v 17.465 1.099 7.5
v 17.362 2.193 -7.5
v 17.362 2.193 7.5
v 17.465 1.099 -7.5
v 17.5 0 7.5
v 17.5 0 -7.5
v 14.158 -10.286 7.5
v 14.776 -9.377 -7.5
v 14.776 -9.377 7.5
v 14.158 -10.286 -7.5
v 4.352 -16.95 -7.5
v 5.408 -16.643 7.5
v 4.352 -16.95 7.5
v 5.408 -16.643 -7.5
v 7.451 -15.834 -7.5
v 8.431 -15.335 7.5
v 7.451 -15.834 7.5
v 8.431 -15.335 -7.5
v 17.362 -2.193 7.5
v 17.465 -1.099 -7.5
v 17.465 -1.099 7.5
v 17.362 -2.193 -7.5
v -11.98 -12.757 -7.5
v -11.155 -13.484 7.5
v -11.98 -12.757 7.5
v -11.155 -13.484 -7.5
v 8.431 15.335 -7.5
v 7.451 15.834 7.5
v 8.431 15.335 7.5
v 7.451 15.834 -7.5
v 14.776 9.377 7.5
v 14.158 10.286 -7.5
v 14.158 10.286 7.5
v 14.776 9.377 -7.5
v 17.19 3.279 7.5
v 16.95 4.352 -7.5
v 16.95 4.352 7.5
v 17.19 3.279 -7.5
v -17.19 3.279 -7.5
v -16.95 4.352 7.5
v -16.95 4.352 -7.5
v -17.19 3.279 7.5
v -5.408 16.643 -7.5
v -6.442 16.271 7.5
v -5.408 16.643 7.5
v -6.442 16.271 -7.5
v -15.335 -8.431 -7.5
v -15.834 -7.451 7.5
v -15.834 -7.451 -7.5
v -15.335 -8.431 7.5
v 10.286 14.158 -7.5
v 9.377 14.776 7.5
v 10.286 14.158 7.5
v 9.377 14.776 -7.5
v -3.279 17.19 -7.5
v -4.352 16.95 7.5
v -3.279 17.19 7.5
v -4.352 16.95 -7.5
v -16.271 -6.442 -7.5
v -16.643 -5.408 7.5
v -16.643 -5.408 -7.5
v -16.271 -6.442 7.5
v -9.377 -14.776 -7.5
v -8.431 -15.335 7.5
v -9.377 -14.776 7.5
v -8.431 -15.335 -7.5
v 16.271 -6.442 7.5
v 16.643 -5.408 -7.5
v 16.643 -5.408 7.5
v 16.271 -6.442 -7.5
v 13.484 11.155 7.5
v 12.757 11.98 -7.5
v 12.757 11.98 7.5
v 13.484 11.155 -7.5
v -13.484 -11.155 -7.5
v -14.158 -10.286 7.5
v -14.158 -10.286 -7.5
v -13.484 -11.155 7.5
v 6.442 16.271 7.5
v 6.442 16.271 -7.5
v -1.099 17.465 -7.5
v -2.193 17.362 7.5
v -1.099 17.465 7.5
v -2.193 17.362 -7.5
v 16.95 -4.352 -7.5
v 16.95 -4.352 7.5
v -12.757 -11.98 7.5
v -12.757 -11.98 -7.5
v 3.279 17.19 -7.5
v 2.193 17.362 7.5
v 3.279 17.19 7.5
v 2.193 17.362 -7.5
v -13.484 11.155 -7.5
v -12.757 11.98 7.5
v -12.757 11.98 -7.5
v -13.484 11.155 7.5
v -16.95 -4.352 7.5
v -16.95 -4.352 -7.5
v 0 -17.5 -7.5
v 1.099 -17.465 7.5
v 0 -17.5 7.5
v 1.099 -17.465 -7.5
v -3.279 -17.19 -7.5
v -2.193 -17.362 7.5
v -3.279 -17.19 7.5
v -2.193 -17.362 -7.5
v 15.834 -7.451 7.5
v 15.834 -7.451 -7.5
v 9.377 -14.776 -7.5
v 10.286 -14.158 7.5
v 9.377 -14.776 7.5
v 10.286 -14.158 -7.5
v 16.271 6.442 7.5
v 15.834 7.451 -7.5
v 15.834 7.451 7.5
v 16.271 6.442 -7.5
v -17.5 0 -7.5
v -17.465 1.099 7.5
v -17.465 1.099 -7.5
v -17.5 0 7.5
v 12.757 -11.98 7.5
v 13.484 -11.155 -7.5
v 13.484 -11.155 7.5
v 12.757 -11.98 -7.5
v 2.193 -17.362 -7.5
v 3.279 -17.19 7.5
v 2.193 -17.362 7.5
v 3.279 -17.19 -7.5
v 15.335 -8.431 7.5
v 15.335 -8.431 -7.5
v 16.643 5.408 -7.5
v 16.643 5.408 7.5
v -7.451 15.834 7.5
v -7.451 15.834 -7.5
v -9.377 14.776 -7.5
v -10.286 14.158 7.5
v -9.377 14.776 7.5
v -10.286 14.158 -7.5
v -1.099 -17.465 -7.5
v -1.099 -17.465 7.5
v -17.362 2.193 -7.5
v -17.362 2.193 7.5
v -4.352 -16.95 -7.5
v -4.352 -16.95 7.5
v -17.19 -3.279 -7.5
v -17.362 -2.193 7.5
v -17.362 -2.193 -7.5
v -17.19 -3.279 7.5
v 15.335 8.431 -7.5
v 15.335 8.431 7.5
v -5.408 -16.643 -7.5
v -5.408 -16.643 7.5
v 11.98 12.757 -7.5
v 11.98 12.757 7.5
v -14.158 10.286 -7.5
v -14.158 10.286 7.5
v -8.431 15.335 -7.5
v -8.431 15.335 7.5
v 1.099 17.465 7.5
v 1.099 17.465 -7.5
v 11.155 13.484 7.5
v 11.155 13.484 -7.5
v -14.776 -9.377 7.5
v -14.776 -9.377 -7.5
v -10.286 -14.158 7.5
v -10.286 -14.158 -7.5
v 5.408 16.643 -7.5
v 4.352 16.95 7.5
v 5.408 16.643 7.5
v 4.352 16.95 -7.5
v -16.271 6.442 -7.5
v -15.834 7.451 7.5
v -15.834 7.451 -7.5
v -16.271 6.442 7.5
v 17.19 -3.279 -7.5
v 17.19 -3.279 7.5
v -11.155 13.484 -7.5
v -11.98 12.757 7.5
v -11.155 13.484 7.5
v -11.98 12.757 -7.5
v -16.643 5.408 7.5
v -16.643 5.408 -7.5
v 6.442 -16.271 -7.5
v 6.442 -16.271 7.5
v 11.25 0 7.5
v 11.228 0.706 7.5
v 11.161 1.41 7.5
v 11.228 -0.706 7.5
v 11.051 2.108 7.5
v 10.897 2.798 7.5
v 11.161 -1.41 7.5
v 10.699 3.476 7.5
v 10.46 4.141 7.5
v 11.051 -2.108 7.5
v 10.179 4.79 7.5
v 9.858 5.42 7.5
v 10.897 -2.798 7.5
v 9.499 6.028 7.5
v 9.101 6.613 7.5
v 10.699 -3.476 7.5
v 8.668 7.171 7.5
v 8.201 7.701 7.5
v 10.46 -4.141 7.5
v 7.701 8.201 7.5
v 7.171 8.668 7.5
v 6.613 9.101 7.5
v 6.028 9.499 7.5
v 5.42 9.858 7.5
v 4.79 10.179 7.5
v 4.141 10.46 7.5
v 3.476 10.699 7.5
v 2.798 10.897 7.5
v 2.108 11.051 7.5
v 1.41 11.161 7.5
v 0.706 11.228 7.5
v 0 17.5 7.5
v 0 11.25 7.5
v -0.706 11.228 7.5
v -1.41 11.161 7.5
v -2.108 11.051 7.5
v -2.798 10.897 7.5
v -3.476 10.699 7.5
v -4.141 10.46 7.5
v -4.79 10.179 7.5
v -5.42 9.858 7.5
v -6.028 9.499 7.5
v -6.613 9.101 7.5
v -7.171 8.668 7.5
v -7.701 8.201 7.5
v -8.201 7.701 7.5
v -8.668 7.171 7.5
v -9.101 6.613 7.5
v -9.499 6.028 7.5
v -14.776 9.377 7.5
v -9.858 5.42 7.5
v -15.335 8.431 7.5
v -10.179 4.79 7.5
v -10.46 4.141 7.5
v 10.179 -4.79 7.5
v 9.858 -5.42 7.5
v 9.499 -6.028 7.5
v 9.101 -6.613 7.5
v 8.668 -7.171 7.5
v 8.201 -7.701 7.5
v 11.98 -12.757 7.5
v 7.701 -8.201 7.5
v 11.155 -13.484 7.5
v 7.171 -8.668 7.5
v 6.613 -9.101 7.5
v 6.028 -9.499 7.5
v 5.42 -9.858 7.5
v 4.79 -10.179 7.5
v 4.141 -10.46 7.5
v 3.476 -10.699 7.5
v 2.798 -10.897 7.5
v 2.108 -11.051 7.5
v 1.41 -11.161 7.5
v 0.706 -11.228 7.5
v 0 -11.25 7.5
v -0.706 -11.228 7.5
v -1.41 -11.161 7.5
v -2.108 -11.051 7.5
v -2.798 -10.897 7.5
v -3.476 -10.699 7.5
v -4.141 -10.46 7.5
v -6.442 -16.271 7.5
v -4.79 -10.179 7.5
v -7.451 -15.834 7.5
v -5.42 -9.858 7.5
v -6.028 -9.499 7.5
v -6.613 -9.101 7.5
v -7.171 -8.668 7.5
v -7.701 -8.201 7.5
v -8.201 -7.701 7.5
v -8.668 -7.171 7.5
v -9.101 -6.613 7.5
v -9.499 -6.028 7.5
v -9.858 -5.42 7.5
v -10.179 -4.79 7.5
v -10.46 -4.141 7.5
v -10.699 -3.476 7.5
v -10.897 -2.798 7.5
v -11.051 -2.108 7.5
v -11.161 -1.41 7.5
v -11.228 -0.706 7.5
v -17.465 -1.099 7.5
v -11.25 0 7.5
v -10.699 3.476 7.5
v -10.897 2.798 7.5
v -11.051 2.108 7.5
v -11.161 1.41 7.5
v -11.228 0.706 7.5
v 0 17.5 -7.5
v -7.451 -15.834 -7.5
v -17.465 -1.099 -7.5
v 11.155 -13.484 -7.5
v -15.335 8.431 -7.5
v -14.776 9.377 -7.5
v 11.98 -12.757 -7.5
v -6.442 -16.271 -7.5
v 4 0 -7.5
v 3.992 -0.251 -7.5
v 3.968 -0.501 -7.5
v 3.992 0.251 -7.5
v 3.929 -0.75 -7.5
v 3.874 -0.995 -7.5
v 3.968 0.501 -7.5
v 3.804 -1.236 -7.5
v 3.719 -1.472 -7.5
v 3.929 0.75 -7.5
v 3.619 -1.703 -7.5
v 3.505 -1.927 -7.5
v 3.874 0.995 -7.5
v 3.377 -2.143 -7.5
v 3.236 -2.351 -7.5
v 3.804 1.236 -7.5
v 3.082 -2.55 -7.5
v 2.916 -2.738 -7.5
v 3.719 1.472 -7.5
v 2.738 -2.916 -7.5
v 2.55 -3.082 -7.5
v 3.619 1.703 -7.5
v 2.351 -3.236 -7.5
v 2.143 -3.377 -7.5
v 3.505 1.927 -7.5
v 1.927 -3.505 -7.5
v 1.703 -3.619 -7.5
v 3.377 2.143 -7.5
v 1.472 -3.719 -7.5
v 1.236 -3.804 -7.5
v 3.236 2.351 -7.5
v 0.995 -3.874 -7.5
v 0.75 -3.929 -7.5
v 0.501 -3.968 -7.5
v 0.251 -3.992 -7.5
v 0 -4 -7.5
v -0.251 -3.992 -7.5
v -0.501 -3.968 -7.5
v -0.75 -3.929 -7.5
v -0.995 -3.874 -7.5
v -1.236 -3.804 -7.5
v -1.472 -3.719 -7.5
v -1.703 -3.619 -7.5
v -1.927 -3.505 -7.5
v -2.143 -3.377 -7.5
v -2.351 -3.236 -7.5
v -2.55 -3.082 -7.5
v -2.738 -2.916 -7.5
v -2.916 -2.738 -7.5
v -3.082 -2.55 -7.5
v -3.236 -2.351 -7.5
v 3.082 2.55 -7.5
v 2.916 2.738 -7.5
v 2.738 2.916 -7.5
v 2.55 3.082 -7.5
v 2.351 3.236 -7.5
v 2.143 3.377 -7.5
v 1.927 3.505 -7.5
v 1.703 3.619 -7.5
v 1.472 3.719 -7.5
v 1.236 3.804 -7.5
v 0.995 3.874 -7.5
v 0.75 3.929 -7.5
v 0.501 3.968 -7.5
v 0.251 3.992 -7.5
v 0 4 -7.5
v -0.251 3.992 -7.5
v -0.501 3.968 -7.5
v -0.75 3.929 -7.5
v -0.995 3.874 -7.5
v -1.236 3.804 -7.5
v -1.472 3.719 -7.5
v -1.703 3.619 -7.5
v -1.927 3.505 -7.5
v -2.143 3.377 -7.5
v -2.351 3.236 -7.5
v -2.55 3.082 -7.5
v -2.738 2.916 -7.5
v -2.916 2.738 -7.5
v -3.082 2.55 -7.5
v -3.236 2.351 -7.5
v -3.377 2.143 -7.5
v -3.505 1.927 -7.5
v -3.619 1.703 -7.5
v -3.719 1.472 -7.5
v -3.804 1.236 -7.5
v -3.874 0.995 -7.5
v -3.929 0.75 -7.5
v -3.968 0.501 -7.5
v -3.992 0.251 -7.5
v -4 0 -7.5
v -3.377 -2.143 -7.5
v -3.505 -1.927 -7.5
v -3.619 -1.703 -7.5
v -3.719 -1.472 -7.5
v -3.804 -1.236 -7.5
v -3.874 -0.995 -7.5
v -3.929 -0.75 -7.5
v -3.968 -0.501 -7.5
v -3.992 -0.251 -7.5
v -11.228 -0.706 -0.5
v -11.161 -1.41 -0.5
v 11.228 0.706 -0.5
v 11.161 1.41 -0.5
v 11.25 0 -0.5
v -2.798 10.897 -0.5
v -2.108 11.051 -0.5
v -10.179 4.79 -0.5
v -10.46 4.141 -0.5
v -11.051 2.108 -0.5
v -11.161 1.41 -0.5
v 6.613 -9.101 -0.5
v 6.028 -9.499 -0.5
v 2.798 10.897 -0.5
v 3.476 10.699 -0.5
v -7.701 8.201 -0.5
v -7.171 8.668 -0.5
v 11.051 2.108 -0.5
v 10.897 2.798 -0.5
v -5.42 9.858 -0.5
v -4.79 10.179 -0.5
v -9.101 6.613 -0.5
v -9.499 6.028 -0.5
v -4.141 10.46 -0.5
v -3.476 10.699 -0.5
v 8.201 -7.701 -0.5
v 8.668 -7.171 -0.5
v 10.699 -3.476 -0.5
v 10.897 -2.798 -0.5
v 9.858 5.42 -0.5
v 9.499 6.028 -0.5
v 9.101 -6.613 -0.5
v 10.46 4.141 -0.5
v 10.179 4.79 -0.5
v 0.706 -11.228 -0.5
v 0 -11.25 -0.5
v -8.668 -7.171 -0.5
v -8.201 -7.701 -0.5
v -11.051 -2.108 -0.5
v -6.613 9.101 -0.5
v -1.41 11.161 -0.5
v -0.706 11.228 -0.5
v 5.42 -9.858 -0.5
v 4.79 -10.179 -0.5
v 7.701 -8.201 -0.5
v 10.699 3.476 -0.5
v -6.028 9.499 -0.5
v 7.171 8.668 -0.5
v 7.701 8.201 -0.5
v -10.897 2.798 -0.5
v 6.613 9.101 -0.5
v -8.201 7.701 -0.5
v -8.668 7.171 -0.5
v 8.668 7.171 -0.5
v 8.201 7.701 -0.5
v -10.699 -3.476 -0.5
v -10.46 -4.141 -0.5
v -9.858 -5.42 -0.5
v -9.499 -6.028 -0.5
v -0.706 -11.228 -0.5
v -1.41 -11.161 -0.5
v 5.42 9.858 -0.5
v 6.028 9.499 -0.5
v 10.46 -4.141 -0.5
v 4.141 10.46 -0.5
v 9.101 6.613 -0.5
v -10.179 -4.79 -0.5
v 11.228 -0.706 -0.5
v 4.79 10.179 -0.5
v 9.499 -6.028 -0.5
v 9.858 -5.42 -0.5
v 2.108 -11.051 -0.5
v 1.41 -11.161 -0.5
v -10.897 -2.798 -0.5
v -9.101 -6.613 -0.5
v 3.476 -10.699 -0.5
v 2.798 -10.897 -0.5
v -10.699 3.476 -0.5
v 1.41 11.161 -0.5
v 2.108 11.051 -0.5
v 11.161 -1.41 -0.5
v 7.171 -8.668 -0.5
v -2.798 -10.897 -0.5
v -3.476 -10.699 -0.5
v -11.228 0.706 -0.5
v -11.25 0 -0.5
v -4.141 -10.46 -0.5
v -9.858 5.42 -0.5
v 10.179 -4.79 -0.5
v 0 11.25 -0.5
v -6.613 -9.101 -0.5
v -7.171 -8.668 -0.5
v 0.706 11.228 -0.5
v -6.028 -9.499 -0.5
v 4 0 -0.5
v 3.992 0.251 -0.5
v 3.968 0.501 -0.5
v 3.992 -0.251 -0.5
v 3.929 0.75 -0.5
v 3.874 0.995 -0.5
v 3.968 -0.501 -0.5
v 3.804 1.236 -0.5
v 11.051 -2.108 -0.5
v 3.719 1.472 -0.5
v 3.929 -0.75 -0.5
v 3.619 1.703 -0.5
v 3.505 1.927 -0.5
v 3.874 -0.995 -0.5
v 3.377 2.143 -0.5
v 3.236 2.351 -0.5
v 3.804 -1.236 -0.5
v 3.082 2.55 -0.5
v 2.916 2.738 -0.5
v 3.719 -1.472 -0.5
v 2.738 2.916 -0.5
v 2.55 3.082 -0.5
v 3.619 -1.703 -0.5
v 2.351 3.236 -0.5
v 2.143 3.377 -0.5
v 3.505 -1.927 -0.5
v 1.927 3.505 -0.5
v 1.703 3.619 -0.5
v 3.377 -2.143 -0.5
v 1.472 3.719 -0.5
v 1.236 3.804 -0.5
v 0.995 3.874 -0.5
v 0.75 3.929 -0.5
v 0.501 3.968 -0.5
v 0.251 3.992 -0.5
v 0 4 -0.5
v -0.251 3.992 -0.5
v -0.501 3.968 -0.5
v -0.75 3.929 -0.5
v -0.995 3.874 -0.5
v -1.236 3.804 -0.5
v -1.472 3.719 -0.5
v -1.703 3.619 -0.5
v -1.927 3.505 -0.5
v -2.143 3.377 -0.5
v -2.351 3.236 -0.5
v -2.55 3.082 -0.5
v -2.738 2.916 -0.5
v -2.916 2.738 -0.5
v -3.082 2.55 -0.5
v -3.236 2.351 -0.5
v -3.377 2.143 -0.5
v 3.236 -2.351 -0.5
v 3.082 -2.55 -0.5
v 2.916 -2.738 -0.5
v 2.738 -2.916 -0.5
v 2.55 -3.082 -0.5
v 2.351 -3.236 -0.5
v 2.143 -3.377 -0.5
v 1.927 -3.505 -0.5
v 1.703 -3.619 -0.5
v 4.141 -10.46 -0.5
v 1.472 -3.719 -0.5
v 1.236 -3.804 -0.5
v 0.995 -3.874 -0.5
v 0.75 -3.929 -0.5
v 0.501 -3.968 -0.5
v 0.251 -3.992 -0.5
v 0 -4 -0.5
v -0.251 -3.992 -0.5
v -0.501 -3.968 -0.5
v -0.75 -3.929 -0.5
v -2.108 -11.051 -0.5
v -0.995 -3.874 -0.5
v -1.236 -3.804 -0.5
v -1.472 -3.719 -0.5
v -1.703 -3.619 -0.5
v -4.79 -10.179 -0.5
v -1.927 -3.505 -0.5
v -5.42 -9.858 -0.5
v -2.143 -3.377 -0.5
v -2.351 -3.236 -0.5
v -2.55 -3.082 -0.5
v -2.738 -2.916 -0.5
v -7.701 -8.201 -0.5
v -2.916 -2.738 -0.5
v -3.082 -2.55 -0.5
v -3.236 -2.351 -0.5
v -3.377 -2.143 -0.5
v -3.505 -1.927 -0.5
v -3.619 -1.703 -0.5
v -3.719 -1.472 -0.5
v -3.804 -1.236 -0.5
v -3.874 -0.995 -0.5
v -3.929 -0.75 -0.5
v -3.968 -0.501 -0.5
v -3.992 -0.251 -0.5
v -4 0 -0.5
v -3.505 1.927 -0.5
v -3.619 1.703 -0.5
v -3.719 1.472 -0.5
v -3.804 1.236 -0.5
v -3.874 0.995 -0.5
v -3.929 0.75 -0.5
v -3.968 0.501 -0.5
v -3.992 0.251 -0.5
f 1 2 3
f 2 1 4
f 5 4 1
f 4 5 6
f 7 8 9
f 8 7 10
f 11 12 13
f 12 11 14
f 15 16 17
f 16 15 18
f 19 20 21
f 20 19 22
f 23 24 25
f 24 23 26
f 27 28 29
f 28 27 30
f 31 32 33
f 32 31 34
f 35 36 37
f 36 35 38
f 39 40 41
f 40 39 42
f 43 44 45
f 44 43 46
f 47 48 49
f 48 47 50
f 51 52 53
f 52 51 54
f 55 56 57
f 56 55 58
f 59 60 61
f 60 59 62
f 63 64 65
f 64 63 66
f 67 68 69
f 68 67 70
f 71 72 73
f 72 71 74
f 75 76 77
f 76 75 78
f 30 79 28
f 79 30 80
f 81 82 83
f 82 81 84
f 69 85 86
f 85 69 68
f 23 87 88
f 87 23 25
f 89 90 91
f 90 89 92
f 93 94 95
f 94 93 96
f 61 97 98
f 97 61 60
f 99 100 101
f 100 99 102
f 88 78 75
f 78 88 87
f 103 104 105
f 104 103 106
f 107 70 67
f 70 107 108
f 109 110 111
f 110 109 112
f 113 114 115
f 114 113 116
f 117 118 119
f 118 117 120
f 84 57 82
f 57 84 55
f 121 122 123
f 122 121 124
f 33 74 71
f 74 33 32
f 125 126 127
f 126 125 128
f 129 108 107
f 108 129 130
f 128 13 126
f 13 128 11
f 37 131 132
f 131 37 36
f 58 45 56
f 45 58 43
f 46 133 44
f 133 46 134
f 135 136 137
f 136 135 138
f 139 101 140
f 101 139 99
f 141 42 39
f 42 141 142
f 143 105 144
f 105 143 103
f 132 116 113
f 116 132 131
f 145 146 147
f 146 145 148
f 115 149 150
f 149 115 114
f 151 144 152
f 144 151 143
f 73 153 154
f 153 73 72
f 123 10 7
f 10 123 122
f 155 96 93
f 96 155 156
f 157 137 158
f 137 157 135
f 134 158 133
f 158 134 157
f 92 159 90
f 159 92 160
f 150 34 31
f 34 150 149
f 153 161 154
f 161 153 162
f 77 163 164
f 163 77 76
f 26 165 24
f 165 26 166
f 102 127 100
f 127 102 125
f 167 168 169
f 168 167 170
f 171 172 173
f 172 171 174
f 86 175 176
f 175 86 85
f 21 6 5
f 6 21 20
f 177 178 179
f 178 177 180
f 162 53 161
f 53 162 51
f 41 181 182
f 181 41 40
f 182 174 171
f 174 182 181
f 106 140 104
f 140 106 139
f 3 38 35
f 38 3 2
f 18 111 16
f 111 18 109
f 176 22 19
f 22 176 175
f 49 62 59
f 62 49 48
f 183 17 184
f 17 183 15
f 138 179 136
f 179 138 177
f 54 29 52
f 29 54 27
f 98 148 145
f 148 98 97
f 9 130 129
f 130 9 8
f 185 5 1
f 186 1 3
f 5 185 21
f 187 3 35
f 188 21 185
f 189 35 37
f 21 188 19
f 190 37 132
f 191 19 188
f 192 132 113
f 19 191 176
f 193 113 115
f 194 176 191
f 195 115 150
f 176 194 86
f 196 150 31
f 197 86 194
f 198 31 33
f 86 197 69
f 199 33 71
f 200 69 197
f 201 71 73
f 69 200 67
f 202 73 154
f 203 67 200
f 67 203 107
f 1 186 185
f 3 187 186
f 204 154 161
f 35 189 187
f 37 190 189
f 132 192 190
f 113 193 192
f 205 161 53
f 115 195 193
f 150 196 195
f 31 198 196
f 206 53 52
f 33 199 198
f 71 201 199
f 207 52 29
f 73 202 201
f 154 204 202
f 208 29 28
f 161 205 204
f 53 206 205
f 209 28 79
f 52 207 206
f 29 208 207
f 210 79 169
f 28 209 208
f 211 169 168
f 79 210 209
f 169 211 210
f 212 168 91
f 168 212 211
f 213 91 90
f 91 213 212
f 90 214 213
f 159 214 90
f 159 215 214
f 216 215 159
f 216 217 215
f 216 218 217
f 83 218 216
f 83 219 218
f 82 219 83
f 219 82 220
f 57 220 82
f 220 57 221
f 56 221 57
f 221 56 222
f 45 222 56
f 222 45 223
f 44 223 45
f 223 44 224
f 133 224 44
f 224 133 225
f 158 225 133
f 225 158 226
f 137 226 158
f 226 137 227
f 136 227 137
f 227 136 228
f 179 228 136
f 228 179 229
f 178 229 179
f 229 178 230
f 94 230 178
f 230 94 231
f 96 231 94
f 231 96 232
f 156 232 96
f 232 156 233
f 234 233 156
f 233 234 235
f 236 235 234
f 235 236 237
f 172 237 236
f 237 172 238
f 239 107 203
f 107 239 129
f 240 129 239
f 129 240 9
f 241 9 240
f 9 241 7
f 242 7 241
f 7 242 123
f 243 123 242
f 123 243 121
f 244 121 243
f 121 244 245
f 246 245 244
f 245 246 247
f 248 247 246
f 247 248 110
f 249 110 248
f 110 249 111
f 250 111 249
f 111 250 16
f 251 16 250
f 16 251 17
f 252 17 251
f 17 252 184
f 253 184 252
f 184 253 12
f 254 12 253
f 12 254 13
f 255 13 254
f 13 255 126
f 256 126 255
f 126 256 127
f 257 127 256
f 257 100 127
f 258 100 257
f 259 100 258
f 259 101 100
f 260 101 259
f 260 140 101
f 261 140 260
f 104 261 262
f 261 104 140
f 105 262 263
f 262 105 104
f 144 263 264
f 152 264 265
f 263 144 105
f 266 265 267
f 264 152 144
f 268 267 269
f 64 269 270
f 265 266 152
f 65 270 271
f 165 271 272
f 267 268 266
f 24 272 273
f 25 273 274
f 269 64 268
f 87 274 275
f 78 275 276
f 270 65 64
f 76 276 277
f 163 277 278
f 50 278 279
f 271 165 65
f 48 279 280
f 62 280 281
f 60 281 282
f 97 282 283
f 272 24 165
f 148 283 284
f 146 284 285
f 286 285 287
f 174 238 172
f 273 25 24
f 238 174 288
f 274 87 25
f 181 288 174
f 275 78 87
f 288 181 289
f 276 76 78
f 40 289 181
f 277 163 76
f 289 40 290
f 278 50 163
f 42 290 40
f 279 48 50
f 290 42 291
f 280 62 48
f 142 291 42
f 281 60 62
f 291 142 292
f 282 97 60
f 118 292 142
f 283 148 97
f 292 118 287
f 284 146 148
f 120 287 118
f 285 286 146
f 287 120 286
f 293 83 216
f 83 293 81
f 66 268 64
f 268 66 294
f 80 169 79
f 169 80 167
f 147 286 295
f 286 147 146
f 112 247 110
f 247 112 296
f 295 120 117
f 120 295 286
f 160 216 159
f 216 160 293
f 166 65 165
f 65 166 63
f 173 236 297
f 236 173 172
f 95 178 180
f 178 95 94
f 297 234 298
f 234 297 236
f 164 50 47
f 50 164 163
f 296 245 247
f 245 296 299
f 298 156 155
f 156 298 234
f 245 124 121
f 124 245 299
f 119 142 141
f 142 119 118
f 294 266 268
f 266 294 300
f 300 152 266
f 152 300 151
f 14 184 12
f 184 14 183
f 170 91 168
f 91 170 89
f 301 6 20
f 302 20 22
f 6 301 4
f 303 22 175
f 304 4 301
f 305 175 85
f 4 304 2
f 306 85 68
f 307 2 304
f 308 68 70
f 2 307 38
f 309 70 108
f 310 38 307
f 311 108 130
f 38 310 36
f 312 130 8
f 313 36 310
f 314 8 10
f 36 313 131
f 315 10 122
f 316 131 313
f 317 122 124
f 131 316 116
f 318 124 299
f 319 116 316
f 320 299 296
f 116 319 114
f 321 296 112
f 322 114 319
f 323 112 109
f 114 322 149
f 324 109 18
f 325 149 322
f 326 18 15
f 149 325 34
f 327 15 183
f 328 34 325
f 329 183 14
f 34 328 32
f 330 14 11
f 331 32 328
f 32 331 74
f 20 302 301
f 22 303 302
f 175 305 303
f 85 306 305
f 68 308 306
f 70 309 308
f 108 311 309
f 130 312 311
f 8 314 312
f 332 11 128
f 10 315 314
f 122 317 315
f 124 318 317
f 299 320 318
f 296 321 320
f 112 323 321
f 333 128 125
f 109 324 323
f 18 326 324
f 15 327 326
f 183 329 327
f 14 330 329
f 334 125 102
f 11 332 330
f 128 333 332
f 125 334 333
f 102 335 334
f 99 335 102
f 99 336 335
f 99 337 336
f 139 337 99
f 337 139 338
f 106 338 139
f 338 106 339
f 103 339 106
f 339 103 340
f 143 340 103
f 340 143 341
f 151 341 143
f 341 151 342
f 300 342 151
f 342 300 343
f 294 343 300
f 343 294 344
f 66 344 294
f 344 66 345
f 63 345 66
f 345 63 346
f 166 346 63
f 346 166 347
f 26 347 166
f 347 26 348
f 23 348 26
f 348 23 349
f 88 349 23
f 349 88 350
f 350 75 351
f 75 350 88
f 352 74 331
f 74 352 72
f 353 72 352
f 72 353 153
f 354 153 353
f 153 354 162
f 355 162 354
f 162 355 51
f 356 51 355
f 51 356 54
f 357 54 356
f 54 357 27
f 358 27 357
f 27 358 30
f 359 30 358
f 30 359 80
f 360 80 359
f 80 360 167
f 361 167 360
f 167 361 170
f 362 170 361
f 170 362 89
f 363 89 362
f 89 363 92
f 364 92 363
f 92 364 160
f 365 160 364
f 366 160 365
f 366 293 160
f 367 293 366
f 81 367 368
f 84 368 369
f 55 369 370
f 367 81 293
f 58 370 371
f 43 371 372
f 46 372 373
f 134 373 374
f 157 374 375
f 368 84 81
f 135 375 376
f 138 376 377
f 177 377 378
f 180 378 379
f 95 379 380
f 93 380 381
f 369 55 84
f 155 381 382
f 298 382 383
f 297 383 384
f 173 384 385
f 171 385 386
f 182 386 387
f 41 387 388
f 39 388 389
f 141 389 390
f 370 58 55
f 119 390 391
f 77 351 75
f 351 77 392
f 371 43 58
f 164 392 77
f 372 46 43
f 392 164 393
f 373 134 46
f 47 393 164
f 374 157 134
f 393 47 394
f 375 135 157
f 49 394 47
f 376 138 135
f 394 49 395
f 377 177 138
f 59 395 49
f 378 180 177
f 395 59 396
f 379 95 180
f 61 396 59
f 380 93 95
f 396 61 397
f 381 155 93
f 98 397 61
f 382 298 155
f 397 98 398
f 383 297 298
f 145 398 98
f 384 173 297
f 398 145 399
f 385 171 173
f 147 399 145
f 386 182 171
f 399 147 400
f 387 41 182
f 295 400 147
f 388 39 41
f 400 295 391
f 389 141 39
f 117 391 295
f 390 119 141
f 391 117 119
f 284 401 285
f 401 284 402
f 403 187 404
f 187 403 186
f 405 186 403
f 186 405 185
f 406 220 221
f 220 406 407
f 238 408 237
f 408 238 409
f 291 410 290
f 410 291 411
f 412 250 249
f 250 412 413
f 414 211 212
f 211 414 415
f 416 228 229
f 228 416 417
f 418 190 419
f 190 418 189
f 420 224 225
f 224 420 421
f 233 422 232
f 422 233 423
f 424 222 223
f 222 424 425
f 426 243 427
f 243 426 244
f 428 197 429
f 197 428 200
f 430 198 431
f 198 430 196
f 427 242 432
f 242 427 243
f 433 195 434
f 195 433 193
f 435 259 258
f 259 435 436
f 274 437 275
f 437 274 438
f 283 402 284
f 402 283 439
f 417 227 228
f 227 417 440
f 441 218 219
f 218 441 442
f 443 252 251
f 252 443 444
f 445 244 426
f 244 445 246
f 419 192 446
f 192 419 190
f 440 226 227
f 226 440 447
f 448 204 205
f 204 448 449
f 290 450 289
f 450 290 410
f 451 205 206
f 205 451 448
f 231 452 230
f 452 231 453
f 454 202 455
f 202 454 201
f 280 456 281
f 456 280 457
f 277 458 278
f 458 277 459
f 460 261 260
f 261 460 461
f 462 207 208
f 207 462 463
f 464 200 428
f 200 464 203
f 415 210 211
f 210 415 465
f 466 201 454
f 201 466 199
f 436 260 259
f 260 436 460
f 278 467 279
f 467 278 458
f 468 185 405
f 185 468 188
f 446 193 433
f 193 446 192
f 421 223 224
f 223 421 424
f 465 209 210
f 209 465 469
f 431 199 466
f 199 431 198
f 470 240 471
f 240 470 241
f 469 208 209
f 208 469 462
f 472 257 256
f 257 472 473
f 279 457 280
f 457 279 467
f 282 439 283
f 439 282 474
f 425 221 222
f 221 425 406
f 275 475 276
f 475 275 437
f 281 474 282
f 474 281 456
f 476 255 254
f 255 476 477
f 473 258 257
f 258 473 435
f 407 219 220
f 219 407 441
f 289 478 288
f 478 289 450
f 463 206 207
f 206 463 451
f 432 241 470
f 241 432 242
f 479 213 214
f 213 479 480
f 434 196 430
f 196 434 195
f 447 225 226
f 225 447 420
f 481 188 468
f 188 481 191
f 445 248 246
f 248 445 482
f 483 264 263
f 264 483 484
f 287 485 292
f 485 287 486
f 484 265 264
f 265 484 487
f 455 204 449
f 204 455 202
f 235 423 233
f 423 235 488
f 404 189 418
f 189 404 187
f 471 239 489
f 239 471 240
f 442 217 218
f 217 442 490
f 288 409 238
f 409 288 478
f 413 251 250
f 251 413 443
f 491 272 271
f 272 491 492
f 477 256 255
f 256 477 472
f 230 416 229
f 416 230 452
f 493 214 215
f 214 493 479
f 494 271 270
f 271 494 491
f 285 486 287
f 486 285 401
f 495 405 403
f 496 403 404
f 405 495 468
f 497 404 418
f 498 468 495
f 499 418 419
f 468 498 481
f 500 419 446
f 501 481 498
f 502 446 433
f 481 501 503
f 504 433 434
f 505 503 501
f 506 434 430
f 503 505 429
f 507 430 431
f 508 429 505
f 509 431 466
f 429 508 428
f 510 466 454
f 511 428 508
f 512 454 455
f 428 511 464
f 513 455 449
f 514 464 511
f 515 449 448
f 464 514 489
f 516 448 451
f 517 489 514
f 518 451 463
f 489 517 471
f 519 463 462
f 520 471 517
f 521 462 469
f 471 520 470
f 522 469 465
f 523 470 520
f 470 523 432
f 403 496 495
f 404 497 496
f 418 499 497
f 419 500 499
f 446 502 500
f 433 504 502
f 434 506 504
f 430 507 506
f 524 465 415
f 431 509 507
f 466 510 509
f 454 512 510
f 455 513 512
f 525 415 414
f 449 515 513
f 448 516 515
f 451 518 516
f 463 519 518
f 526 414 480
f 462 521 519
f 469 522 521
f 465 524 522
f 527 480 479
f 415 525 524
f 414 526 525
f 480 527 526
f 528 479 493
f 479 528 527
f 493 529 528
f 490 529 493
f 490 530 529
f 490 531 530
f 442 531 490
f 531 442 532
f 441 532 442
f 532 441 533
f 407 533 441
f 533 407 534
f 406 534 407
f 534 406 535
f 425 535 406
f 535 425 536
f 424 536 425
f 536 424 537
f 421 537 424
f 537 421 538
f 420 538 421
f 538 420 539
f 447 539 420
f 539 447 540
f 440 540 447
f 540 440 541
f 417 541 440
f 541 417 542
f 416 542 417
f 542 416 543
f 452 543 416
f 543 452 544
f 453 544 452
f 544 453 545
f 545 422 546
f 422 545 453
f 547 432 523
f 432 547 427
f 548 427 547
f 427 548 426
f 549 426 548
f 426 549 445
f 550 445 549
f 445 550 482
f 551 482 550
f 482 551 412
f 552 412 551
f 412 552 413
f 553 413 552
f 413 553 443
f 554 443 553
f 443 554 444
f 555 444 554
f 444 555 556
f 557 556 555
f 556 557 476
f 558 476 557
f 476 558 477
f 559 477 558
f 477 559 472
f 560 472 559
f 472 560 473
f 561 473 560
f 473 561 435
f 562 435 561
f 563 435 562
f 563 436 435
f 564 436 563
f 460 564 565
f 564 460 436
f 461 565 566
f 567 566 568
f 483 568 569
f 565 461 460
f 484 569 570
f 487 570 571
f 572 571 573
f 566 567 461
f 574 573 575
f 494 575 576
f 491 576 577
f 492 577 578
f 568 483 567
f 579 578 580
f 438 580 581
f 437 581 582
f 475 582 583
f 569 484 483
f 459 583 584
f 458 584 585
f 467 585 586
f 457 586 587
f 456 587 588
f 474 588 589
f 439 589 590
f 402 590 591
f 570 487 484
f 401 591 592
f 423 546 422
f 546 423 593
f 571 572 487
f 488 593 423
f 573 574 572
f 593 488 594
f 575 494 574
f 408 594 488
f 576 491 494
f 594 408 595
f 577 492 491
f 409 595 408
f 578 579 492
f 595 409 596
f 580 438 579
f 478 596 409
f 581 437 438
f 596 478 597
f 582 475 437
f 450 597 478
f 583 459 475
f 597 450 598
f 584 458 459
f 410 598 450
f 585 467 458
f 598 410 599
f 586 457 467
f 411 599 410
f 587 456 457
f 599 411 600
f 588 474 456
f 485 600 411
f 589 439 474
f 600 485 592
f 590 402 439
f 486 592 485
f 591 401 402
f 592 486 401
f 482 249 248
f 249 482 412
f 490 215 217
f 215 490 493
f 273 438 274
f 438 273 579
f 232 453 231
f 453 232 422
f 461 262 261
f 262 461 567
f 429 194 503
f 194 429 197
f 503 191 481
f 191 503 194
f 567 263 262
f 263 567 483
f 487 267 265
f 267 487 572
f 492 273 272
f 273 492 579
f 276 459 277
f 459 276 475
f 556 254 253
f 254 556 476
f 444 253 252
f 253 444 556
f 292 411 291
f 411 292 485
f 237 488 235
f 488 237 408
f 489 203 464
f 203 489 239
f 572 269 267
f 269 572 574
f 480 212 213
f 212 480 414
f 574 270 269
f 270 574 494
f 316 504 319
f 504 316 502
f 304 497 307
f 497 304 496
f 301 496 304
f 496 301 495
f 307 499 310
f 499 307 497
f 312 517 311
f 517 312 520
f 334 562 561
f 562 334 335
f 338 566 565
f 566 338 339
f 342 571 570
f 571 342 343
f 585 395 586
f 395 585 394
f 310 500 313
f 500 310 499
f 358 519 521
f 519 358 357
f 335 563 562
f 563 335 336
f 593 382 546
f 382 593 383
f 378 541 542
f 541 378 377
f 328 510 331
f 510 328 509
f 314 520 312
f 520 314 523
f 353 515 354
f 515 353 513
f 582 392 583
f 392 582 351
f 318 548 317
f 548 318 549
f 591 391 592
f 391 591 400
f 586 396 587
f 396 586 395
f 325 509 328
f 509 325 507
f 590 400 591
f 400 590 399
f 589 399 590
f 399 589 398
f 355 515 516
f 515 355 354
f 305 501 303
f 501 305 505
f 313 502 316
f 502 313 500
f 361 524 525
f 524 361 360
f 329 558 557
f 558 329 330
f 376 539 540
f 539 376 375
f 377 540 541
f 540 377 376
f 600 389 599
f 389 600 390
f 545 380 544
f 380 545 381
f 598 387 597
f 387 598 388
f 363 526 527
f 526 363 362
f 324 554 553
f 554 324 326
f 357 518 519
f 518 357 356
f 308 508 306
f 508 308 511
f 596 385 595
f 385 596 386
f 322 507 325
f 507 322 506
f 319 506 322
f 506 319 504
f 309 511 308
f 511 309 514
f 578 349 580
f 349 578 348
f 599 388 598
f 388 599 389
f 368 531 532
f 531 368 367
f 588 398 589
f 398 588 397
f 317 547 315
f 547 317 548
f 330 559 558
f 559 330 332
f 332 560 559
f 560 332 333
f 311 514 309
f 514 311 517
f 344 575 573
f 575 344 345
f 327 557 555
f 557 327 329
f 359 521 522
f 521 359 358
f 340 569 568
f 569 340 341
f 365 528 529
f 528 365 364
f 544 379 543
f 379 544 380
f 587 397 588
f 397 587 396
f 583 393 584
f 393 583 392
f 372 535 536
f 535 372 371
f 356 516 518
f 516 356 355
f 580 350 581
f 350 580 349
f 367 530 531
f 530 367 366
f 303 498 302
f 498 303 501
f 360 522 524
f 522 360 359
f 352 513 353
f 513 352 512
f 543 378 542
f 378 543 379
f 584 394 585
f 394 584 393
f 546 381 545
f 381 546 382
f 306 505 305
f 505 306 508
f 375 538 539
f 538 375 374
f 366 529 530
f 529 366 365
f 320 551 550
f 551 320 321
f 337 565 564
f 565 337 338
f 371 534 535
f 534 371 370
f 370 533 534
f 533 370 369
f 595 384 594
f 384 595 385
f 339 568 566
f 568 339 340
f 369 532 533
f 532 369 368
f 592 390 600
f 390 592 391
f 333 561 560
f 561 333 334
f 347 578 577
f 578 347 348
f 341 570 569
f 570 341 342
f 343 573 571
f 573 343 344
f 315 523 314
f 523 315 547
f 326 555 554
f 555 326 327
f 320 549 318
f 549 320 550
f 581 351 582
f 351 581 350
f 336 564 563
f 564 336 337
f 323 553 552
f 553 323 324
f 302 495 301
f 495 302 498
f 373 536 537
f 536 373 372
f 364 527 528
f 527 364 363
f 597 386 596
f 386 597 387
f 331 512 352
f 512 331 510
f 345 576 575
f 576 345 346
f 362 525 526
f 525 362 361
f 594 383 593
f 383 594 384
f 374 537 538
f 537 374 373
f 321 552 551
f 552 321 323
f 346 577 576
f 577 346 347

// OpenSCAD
// This is a depriming base.
//
// Warning -- some sanding and fitting may be required.
//
// This is licensed under the creative commons+attribution license
//
// To fulfil the attribution requirement, please link to:
// http://www.thingiverse.com/thing:2208570

/* [Main] */

// Define shape of object
shape=0; // [0:Round Shape,1:Hex Shape,2:Square Shape]

// Define number of facets (large numbers provide better smoothing)
$fn=100;

// Define height of the cylinder wall in mm
height=15.0;

// Define outside diameter of cylinder in mm
outside_diameter=35.0;

// Define inside diameter of hollowed out area in mm
inside_diameter=22.5;

// Define diameter of smaller hole in mm
hole_diameter=8.0;

difference()
{
	// Make outer shape
	if(shape==0)
	{
		translate([0,0,0])         cylinder(h=height,r=outside_diameter/2,center=true);
	}
	if(shape==1)
	{
		translate([0,0,0])         cylinder(h=height,r=outside_diameter/2,center=true,$fn=6);
	}
	if(shape==2)
	{
		translate([0,0,0])         cylinder(h=height,r=outside_diameter/2+4,center=true,$fn=4);
	}
	// Make inner shape
	#translate([0,0,height/4]) cylinder(h=height/2+1,r=inside_diameter/2,center=true);
	// Drill hole
	translate([0,0,0])        cylinder(h=height+1,r=hole_diameter/2,center=true);
}
